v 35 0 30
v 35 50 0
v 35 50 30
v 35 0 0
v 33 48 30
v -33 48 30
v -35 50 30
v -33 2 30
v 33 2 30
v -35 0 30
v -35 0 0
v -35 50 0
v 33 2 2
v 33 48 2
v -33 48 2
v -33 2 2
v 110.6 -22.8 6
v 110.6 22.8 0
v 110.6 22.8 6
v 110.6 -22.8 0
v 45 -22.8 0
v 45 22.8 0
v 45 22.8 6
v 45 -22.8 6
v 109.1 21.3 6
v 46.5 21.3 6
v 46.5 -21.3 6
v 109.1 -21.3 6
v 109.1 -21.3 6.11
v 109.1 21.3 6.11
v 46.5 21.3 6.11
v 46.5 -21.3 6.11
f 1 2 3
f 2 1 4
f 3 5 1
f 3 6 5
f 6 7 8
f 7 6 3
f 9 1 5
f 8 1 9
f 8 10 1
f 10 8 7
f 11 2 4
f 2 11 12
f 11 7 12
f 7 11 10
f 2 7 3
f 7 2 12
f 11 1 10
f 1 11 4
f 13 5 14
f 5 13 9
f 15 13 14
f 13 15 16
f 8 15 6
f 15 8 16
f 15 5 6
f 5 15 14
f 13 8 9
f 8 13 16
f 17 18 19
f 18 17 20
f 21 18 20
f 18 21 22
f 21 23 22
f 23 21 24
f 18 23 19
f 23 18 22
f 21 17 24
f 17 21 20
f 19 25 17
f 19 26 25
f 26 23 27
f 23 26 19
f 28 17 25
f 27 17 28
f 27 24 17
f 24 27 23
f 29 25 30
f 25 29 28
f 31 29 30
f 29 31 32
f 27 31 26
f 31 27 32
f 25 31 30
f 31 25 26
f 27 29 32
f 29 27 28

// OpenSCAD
// Enclosure for Arduino-based temperature logger
// Part 1: Box (base)
// Part 2: Lid (with lip)

// Global settings
$fn = 64; // High resolution for curves

// Box dimensions (outer)
box_outer_x = 70;
box_outer_y = 50;
box_outer_z = 30;

// Wall and floor thickness
wall_thick = 2;
floor_thick = 2;

// Lid dimensions
lid_plate_z = 2;
lid_lip_height = 4;
lid_lip_thick = 1.5;
lid_clearance = 0.2; // clearance on each side

// Gap between parts for printing
gap = 10;

// Compute inner dimensions of box
box_inner_x = box_outer_x - 2 * wall_thick;
box_inner_y = box_outer_y - 2 * wall_thick;
box_inner_z = box_outer_z - floor_thick;

// Compute lid lip outer dimensions (to fit into box with clearance)
lid_lip_outer_x = box_inner_x - 2 * lid_clearance;
lid_lip_outer_y = box_inner_y - 2 * lid_clearance;

// Positioning: Box centered at origin, lid on +X side with gap
box_x_pos = -box_outer_x / 2;
box_y_pos = 0;
lid_x_pos = box_x_pos + box_outer_x + gap + lid_lip_outer_x / 2;
lid_y_pos = 0;

// Part 1: Box (base)
module box_part() {
    // Outer shell
    difference() {
        // Outer box
        translate([box_x_pos, box_y_pos, 0])
            cube([box_outer_x, box_outer_y, box_outer_z]);
        
        // Inner cavity (hollow)
        translate([box_x_pos + wall_thick, box_y_pos + wall_thick, floor_thick])
            cube([box_inner_x, box_inner_y, box_inner_z + 0.1]);
        
        // Remove bottom face (open top, no bottom needed for hollowing)
        // Already handled by cavity starting at floor_thick
    }
    
    // Floor (solid base)
    translate([box_x_pos, box_y_pos, 0])
        cube([box_outer_x, box_outer_y, floor_thick]);
}

// Part 2: Lid (printed upside down)
module lid_part() {
    // Plate (base of lid)
    translate([lid_x_pos - lid_lip_outer_x / 2, lid_y_pos - lid_lip_outer_y / 2, 0])
        cube([lid_lip_outer_x, lid_lip_outer_y, lid_plate_z]);
    
    // Lip (upward from plate, printed upside down)
    // Lip outer dimensions: lid_lip_outer_x x lid_lip_outer_y
    // Lip thickness: lid_lip_thick
    // Lip height: lid_lip_height
    
    // Compute lip position relative to plate
    lip_x = lid_x_pos - lid_lip_outer_x / 2 + lid_lip_thick;
    lip_y = lid_y_pos - lid_lip_outer_y / 2 + lid_lip_thick;
    lip_width = lid_lip_outer_x - 2 * lid_lip_thick;
    lip_depth = lid_lip_outer_y - 2 * lid_lip_thick;
    
    // Lip (as a hollow rectangular tube on top of plate)
    // Since printed upside down, the lip will be on the bottom when assembled
    translate([lid_x_pos - lid_lip_outer_x / 2, lid_y_pos - lid_lip_outer_y / 2, lid_plate_z])
        cube([lid_lip_outer_x, lid_lip_outer_y, lid_lip_height]);
    
    // Hollow out the lip (to create the inner cavity for sliding fit)
    translate([lid_x_pos - lid_lip_outer_x / 2 + lid_lip_thick, lid_y_pos - lid_lip_outer_y / 2 + lid_lip_thick, lid_plate_z + 0.01])
        cube([lid_lip_outer_x - 2 * lid_lip_thick, lid_lip_outer_y - 2 * lid_lip_thick, lid_lip_height + 0.1]);
}

// Render both parts
box_part();
lid_part();
